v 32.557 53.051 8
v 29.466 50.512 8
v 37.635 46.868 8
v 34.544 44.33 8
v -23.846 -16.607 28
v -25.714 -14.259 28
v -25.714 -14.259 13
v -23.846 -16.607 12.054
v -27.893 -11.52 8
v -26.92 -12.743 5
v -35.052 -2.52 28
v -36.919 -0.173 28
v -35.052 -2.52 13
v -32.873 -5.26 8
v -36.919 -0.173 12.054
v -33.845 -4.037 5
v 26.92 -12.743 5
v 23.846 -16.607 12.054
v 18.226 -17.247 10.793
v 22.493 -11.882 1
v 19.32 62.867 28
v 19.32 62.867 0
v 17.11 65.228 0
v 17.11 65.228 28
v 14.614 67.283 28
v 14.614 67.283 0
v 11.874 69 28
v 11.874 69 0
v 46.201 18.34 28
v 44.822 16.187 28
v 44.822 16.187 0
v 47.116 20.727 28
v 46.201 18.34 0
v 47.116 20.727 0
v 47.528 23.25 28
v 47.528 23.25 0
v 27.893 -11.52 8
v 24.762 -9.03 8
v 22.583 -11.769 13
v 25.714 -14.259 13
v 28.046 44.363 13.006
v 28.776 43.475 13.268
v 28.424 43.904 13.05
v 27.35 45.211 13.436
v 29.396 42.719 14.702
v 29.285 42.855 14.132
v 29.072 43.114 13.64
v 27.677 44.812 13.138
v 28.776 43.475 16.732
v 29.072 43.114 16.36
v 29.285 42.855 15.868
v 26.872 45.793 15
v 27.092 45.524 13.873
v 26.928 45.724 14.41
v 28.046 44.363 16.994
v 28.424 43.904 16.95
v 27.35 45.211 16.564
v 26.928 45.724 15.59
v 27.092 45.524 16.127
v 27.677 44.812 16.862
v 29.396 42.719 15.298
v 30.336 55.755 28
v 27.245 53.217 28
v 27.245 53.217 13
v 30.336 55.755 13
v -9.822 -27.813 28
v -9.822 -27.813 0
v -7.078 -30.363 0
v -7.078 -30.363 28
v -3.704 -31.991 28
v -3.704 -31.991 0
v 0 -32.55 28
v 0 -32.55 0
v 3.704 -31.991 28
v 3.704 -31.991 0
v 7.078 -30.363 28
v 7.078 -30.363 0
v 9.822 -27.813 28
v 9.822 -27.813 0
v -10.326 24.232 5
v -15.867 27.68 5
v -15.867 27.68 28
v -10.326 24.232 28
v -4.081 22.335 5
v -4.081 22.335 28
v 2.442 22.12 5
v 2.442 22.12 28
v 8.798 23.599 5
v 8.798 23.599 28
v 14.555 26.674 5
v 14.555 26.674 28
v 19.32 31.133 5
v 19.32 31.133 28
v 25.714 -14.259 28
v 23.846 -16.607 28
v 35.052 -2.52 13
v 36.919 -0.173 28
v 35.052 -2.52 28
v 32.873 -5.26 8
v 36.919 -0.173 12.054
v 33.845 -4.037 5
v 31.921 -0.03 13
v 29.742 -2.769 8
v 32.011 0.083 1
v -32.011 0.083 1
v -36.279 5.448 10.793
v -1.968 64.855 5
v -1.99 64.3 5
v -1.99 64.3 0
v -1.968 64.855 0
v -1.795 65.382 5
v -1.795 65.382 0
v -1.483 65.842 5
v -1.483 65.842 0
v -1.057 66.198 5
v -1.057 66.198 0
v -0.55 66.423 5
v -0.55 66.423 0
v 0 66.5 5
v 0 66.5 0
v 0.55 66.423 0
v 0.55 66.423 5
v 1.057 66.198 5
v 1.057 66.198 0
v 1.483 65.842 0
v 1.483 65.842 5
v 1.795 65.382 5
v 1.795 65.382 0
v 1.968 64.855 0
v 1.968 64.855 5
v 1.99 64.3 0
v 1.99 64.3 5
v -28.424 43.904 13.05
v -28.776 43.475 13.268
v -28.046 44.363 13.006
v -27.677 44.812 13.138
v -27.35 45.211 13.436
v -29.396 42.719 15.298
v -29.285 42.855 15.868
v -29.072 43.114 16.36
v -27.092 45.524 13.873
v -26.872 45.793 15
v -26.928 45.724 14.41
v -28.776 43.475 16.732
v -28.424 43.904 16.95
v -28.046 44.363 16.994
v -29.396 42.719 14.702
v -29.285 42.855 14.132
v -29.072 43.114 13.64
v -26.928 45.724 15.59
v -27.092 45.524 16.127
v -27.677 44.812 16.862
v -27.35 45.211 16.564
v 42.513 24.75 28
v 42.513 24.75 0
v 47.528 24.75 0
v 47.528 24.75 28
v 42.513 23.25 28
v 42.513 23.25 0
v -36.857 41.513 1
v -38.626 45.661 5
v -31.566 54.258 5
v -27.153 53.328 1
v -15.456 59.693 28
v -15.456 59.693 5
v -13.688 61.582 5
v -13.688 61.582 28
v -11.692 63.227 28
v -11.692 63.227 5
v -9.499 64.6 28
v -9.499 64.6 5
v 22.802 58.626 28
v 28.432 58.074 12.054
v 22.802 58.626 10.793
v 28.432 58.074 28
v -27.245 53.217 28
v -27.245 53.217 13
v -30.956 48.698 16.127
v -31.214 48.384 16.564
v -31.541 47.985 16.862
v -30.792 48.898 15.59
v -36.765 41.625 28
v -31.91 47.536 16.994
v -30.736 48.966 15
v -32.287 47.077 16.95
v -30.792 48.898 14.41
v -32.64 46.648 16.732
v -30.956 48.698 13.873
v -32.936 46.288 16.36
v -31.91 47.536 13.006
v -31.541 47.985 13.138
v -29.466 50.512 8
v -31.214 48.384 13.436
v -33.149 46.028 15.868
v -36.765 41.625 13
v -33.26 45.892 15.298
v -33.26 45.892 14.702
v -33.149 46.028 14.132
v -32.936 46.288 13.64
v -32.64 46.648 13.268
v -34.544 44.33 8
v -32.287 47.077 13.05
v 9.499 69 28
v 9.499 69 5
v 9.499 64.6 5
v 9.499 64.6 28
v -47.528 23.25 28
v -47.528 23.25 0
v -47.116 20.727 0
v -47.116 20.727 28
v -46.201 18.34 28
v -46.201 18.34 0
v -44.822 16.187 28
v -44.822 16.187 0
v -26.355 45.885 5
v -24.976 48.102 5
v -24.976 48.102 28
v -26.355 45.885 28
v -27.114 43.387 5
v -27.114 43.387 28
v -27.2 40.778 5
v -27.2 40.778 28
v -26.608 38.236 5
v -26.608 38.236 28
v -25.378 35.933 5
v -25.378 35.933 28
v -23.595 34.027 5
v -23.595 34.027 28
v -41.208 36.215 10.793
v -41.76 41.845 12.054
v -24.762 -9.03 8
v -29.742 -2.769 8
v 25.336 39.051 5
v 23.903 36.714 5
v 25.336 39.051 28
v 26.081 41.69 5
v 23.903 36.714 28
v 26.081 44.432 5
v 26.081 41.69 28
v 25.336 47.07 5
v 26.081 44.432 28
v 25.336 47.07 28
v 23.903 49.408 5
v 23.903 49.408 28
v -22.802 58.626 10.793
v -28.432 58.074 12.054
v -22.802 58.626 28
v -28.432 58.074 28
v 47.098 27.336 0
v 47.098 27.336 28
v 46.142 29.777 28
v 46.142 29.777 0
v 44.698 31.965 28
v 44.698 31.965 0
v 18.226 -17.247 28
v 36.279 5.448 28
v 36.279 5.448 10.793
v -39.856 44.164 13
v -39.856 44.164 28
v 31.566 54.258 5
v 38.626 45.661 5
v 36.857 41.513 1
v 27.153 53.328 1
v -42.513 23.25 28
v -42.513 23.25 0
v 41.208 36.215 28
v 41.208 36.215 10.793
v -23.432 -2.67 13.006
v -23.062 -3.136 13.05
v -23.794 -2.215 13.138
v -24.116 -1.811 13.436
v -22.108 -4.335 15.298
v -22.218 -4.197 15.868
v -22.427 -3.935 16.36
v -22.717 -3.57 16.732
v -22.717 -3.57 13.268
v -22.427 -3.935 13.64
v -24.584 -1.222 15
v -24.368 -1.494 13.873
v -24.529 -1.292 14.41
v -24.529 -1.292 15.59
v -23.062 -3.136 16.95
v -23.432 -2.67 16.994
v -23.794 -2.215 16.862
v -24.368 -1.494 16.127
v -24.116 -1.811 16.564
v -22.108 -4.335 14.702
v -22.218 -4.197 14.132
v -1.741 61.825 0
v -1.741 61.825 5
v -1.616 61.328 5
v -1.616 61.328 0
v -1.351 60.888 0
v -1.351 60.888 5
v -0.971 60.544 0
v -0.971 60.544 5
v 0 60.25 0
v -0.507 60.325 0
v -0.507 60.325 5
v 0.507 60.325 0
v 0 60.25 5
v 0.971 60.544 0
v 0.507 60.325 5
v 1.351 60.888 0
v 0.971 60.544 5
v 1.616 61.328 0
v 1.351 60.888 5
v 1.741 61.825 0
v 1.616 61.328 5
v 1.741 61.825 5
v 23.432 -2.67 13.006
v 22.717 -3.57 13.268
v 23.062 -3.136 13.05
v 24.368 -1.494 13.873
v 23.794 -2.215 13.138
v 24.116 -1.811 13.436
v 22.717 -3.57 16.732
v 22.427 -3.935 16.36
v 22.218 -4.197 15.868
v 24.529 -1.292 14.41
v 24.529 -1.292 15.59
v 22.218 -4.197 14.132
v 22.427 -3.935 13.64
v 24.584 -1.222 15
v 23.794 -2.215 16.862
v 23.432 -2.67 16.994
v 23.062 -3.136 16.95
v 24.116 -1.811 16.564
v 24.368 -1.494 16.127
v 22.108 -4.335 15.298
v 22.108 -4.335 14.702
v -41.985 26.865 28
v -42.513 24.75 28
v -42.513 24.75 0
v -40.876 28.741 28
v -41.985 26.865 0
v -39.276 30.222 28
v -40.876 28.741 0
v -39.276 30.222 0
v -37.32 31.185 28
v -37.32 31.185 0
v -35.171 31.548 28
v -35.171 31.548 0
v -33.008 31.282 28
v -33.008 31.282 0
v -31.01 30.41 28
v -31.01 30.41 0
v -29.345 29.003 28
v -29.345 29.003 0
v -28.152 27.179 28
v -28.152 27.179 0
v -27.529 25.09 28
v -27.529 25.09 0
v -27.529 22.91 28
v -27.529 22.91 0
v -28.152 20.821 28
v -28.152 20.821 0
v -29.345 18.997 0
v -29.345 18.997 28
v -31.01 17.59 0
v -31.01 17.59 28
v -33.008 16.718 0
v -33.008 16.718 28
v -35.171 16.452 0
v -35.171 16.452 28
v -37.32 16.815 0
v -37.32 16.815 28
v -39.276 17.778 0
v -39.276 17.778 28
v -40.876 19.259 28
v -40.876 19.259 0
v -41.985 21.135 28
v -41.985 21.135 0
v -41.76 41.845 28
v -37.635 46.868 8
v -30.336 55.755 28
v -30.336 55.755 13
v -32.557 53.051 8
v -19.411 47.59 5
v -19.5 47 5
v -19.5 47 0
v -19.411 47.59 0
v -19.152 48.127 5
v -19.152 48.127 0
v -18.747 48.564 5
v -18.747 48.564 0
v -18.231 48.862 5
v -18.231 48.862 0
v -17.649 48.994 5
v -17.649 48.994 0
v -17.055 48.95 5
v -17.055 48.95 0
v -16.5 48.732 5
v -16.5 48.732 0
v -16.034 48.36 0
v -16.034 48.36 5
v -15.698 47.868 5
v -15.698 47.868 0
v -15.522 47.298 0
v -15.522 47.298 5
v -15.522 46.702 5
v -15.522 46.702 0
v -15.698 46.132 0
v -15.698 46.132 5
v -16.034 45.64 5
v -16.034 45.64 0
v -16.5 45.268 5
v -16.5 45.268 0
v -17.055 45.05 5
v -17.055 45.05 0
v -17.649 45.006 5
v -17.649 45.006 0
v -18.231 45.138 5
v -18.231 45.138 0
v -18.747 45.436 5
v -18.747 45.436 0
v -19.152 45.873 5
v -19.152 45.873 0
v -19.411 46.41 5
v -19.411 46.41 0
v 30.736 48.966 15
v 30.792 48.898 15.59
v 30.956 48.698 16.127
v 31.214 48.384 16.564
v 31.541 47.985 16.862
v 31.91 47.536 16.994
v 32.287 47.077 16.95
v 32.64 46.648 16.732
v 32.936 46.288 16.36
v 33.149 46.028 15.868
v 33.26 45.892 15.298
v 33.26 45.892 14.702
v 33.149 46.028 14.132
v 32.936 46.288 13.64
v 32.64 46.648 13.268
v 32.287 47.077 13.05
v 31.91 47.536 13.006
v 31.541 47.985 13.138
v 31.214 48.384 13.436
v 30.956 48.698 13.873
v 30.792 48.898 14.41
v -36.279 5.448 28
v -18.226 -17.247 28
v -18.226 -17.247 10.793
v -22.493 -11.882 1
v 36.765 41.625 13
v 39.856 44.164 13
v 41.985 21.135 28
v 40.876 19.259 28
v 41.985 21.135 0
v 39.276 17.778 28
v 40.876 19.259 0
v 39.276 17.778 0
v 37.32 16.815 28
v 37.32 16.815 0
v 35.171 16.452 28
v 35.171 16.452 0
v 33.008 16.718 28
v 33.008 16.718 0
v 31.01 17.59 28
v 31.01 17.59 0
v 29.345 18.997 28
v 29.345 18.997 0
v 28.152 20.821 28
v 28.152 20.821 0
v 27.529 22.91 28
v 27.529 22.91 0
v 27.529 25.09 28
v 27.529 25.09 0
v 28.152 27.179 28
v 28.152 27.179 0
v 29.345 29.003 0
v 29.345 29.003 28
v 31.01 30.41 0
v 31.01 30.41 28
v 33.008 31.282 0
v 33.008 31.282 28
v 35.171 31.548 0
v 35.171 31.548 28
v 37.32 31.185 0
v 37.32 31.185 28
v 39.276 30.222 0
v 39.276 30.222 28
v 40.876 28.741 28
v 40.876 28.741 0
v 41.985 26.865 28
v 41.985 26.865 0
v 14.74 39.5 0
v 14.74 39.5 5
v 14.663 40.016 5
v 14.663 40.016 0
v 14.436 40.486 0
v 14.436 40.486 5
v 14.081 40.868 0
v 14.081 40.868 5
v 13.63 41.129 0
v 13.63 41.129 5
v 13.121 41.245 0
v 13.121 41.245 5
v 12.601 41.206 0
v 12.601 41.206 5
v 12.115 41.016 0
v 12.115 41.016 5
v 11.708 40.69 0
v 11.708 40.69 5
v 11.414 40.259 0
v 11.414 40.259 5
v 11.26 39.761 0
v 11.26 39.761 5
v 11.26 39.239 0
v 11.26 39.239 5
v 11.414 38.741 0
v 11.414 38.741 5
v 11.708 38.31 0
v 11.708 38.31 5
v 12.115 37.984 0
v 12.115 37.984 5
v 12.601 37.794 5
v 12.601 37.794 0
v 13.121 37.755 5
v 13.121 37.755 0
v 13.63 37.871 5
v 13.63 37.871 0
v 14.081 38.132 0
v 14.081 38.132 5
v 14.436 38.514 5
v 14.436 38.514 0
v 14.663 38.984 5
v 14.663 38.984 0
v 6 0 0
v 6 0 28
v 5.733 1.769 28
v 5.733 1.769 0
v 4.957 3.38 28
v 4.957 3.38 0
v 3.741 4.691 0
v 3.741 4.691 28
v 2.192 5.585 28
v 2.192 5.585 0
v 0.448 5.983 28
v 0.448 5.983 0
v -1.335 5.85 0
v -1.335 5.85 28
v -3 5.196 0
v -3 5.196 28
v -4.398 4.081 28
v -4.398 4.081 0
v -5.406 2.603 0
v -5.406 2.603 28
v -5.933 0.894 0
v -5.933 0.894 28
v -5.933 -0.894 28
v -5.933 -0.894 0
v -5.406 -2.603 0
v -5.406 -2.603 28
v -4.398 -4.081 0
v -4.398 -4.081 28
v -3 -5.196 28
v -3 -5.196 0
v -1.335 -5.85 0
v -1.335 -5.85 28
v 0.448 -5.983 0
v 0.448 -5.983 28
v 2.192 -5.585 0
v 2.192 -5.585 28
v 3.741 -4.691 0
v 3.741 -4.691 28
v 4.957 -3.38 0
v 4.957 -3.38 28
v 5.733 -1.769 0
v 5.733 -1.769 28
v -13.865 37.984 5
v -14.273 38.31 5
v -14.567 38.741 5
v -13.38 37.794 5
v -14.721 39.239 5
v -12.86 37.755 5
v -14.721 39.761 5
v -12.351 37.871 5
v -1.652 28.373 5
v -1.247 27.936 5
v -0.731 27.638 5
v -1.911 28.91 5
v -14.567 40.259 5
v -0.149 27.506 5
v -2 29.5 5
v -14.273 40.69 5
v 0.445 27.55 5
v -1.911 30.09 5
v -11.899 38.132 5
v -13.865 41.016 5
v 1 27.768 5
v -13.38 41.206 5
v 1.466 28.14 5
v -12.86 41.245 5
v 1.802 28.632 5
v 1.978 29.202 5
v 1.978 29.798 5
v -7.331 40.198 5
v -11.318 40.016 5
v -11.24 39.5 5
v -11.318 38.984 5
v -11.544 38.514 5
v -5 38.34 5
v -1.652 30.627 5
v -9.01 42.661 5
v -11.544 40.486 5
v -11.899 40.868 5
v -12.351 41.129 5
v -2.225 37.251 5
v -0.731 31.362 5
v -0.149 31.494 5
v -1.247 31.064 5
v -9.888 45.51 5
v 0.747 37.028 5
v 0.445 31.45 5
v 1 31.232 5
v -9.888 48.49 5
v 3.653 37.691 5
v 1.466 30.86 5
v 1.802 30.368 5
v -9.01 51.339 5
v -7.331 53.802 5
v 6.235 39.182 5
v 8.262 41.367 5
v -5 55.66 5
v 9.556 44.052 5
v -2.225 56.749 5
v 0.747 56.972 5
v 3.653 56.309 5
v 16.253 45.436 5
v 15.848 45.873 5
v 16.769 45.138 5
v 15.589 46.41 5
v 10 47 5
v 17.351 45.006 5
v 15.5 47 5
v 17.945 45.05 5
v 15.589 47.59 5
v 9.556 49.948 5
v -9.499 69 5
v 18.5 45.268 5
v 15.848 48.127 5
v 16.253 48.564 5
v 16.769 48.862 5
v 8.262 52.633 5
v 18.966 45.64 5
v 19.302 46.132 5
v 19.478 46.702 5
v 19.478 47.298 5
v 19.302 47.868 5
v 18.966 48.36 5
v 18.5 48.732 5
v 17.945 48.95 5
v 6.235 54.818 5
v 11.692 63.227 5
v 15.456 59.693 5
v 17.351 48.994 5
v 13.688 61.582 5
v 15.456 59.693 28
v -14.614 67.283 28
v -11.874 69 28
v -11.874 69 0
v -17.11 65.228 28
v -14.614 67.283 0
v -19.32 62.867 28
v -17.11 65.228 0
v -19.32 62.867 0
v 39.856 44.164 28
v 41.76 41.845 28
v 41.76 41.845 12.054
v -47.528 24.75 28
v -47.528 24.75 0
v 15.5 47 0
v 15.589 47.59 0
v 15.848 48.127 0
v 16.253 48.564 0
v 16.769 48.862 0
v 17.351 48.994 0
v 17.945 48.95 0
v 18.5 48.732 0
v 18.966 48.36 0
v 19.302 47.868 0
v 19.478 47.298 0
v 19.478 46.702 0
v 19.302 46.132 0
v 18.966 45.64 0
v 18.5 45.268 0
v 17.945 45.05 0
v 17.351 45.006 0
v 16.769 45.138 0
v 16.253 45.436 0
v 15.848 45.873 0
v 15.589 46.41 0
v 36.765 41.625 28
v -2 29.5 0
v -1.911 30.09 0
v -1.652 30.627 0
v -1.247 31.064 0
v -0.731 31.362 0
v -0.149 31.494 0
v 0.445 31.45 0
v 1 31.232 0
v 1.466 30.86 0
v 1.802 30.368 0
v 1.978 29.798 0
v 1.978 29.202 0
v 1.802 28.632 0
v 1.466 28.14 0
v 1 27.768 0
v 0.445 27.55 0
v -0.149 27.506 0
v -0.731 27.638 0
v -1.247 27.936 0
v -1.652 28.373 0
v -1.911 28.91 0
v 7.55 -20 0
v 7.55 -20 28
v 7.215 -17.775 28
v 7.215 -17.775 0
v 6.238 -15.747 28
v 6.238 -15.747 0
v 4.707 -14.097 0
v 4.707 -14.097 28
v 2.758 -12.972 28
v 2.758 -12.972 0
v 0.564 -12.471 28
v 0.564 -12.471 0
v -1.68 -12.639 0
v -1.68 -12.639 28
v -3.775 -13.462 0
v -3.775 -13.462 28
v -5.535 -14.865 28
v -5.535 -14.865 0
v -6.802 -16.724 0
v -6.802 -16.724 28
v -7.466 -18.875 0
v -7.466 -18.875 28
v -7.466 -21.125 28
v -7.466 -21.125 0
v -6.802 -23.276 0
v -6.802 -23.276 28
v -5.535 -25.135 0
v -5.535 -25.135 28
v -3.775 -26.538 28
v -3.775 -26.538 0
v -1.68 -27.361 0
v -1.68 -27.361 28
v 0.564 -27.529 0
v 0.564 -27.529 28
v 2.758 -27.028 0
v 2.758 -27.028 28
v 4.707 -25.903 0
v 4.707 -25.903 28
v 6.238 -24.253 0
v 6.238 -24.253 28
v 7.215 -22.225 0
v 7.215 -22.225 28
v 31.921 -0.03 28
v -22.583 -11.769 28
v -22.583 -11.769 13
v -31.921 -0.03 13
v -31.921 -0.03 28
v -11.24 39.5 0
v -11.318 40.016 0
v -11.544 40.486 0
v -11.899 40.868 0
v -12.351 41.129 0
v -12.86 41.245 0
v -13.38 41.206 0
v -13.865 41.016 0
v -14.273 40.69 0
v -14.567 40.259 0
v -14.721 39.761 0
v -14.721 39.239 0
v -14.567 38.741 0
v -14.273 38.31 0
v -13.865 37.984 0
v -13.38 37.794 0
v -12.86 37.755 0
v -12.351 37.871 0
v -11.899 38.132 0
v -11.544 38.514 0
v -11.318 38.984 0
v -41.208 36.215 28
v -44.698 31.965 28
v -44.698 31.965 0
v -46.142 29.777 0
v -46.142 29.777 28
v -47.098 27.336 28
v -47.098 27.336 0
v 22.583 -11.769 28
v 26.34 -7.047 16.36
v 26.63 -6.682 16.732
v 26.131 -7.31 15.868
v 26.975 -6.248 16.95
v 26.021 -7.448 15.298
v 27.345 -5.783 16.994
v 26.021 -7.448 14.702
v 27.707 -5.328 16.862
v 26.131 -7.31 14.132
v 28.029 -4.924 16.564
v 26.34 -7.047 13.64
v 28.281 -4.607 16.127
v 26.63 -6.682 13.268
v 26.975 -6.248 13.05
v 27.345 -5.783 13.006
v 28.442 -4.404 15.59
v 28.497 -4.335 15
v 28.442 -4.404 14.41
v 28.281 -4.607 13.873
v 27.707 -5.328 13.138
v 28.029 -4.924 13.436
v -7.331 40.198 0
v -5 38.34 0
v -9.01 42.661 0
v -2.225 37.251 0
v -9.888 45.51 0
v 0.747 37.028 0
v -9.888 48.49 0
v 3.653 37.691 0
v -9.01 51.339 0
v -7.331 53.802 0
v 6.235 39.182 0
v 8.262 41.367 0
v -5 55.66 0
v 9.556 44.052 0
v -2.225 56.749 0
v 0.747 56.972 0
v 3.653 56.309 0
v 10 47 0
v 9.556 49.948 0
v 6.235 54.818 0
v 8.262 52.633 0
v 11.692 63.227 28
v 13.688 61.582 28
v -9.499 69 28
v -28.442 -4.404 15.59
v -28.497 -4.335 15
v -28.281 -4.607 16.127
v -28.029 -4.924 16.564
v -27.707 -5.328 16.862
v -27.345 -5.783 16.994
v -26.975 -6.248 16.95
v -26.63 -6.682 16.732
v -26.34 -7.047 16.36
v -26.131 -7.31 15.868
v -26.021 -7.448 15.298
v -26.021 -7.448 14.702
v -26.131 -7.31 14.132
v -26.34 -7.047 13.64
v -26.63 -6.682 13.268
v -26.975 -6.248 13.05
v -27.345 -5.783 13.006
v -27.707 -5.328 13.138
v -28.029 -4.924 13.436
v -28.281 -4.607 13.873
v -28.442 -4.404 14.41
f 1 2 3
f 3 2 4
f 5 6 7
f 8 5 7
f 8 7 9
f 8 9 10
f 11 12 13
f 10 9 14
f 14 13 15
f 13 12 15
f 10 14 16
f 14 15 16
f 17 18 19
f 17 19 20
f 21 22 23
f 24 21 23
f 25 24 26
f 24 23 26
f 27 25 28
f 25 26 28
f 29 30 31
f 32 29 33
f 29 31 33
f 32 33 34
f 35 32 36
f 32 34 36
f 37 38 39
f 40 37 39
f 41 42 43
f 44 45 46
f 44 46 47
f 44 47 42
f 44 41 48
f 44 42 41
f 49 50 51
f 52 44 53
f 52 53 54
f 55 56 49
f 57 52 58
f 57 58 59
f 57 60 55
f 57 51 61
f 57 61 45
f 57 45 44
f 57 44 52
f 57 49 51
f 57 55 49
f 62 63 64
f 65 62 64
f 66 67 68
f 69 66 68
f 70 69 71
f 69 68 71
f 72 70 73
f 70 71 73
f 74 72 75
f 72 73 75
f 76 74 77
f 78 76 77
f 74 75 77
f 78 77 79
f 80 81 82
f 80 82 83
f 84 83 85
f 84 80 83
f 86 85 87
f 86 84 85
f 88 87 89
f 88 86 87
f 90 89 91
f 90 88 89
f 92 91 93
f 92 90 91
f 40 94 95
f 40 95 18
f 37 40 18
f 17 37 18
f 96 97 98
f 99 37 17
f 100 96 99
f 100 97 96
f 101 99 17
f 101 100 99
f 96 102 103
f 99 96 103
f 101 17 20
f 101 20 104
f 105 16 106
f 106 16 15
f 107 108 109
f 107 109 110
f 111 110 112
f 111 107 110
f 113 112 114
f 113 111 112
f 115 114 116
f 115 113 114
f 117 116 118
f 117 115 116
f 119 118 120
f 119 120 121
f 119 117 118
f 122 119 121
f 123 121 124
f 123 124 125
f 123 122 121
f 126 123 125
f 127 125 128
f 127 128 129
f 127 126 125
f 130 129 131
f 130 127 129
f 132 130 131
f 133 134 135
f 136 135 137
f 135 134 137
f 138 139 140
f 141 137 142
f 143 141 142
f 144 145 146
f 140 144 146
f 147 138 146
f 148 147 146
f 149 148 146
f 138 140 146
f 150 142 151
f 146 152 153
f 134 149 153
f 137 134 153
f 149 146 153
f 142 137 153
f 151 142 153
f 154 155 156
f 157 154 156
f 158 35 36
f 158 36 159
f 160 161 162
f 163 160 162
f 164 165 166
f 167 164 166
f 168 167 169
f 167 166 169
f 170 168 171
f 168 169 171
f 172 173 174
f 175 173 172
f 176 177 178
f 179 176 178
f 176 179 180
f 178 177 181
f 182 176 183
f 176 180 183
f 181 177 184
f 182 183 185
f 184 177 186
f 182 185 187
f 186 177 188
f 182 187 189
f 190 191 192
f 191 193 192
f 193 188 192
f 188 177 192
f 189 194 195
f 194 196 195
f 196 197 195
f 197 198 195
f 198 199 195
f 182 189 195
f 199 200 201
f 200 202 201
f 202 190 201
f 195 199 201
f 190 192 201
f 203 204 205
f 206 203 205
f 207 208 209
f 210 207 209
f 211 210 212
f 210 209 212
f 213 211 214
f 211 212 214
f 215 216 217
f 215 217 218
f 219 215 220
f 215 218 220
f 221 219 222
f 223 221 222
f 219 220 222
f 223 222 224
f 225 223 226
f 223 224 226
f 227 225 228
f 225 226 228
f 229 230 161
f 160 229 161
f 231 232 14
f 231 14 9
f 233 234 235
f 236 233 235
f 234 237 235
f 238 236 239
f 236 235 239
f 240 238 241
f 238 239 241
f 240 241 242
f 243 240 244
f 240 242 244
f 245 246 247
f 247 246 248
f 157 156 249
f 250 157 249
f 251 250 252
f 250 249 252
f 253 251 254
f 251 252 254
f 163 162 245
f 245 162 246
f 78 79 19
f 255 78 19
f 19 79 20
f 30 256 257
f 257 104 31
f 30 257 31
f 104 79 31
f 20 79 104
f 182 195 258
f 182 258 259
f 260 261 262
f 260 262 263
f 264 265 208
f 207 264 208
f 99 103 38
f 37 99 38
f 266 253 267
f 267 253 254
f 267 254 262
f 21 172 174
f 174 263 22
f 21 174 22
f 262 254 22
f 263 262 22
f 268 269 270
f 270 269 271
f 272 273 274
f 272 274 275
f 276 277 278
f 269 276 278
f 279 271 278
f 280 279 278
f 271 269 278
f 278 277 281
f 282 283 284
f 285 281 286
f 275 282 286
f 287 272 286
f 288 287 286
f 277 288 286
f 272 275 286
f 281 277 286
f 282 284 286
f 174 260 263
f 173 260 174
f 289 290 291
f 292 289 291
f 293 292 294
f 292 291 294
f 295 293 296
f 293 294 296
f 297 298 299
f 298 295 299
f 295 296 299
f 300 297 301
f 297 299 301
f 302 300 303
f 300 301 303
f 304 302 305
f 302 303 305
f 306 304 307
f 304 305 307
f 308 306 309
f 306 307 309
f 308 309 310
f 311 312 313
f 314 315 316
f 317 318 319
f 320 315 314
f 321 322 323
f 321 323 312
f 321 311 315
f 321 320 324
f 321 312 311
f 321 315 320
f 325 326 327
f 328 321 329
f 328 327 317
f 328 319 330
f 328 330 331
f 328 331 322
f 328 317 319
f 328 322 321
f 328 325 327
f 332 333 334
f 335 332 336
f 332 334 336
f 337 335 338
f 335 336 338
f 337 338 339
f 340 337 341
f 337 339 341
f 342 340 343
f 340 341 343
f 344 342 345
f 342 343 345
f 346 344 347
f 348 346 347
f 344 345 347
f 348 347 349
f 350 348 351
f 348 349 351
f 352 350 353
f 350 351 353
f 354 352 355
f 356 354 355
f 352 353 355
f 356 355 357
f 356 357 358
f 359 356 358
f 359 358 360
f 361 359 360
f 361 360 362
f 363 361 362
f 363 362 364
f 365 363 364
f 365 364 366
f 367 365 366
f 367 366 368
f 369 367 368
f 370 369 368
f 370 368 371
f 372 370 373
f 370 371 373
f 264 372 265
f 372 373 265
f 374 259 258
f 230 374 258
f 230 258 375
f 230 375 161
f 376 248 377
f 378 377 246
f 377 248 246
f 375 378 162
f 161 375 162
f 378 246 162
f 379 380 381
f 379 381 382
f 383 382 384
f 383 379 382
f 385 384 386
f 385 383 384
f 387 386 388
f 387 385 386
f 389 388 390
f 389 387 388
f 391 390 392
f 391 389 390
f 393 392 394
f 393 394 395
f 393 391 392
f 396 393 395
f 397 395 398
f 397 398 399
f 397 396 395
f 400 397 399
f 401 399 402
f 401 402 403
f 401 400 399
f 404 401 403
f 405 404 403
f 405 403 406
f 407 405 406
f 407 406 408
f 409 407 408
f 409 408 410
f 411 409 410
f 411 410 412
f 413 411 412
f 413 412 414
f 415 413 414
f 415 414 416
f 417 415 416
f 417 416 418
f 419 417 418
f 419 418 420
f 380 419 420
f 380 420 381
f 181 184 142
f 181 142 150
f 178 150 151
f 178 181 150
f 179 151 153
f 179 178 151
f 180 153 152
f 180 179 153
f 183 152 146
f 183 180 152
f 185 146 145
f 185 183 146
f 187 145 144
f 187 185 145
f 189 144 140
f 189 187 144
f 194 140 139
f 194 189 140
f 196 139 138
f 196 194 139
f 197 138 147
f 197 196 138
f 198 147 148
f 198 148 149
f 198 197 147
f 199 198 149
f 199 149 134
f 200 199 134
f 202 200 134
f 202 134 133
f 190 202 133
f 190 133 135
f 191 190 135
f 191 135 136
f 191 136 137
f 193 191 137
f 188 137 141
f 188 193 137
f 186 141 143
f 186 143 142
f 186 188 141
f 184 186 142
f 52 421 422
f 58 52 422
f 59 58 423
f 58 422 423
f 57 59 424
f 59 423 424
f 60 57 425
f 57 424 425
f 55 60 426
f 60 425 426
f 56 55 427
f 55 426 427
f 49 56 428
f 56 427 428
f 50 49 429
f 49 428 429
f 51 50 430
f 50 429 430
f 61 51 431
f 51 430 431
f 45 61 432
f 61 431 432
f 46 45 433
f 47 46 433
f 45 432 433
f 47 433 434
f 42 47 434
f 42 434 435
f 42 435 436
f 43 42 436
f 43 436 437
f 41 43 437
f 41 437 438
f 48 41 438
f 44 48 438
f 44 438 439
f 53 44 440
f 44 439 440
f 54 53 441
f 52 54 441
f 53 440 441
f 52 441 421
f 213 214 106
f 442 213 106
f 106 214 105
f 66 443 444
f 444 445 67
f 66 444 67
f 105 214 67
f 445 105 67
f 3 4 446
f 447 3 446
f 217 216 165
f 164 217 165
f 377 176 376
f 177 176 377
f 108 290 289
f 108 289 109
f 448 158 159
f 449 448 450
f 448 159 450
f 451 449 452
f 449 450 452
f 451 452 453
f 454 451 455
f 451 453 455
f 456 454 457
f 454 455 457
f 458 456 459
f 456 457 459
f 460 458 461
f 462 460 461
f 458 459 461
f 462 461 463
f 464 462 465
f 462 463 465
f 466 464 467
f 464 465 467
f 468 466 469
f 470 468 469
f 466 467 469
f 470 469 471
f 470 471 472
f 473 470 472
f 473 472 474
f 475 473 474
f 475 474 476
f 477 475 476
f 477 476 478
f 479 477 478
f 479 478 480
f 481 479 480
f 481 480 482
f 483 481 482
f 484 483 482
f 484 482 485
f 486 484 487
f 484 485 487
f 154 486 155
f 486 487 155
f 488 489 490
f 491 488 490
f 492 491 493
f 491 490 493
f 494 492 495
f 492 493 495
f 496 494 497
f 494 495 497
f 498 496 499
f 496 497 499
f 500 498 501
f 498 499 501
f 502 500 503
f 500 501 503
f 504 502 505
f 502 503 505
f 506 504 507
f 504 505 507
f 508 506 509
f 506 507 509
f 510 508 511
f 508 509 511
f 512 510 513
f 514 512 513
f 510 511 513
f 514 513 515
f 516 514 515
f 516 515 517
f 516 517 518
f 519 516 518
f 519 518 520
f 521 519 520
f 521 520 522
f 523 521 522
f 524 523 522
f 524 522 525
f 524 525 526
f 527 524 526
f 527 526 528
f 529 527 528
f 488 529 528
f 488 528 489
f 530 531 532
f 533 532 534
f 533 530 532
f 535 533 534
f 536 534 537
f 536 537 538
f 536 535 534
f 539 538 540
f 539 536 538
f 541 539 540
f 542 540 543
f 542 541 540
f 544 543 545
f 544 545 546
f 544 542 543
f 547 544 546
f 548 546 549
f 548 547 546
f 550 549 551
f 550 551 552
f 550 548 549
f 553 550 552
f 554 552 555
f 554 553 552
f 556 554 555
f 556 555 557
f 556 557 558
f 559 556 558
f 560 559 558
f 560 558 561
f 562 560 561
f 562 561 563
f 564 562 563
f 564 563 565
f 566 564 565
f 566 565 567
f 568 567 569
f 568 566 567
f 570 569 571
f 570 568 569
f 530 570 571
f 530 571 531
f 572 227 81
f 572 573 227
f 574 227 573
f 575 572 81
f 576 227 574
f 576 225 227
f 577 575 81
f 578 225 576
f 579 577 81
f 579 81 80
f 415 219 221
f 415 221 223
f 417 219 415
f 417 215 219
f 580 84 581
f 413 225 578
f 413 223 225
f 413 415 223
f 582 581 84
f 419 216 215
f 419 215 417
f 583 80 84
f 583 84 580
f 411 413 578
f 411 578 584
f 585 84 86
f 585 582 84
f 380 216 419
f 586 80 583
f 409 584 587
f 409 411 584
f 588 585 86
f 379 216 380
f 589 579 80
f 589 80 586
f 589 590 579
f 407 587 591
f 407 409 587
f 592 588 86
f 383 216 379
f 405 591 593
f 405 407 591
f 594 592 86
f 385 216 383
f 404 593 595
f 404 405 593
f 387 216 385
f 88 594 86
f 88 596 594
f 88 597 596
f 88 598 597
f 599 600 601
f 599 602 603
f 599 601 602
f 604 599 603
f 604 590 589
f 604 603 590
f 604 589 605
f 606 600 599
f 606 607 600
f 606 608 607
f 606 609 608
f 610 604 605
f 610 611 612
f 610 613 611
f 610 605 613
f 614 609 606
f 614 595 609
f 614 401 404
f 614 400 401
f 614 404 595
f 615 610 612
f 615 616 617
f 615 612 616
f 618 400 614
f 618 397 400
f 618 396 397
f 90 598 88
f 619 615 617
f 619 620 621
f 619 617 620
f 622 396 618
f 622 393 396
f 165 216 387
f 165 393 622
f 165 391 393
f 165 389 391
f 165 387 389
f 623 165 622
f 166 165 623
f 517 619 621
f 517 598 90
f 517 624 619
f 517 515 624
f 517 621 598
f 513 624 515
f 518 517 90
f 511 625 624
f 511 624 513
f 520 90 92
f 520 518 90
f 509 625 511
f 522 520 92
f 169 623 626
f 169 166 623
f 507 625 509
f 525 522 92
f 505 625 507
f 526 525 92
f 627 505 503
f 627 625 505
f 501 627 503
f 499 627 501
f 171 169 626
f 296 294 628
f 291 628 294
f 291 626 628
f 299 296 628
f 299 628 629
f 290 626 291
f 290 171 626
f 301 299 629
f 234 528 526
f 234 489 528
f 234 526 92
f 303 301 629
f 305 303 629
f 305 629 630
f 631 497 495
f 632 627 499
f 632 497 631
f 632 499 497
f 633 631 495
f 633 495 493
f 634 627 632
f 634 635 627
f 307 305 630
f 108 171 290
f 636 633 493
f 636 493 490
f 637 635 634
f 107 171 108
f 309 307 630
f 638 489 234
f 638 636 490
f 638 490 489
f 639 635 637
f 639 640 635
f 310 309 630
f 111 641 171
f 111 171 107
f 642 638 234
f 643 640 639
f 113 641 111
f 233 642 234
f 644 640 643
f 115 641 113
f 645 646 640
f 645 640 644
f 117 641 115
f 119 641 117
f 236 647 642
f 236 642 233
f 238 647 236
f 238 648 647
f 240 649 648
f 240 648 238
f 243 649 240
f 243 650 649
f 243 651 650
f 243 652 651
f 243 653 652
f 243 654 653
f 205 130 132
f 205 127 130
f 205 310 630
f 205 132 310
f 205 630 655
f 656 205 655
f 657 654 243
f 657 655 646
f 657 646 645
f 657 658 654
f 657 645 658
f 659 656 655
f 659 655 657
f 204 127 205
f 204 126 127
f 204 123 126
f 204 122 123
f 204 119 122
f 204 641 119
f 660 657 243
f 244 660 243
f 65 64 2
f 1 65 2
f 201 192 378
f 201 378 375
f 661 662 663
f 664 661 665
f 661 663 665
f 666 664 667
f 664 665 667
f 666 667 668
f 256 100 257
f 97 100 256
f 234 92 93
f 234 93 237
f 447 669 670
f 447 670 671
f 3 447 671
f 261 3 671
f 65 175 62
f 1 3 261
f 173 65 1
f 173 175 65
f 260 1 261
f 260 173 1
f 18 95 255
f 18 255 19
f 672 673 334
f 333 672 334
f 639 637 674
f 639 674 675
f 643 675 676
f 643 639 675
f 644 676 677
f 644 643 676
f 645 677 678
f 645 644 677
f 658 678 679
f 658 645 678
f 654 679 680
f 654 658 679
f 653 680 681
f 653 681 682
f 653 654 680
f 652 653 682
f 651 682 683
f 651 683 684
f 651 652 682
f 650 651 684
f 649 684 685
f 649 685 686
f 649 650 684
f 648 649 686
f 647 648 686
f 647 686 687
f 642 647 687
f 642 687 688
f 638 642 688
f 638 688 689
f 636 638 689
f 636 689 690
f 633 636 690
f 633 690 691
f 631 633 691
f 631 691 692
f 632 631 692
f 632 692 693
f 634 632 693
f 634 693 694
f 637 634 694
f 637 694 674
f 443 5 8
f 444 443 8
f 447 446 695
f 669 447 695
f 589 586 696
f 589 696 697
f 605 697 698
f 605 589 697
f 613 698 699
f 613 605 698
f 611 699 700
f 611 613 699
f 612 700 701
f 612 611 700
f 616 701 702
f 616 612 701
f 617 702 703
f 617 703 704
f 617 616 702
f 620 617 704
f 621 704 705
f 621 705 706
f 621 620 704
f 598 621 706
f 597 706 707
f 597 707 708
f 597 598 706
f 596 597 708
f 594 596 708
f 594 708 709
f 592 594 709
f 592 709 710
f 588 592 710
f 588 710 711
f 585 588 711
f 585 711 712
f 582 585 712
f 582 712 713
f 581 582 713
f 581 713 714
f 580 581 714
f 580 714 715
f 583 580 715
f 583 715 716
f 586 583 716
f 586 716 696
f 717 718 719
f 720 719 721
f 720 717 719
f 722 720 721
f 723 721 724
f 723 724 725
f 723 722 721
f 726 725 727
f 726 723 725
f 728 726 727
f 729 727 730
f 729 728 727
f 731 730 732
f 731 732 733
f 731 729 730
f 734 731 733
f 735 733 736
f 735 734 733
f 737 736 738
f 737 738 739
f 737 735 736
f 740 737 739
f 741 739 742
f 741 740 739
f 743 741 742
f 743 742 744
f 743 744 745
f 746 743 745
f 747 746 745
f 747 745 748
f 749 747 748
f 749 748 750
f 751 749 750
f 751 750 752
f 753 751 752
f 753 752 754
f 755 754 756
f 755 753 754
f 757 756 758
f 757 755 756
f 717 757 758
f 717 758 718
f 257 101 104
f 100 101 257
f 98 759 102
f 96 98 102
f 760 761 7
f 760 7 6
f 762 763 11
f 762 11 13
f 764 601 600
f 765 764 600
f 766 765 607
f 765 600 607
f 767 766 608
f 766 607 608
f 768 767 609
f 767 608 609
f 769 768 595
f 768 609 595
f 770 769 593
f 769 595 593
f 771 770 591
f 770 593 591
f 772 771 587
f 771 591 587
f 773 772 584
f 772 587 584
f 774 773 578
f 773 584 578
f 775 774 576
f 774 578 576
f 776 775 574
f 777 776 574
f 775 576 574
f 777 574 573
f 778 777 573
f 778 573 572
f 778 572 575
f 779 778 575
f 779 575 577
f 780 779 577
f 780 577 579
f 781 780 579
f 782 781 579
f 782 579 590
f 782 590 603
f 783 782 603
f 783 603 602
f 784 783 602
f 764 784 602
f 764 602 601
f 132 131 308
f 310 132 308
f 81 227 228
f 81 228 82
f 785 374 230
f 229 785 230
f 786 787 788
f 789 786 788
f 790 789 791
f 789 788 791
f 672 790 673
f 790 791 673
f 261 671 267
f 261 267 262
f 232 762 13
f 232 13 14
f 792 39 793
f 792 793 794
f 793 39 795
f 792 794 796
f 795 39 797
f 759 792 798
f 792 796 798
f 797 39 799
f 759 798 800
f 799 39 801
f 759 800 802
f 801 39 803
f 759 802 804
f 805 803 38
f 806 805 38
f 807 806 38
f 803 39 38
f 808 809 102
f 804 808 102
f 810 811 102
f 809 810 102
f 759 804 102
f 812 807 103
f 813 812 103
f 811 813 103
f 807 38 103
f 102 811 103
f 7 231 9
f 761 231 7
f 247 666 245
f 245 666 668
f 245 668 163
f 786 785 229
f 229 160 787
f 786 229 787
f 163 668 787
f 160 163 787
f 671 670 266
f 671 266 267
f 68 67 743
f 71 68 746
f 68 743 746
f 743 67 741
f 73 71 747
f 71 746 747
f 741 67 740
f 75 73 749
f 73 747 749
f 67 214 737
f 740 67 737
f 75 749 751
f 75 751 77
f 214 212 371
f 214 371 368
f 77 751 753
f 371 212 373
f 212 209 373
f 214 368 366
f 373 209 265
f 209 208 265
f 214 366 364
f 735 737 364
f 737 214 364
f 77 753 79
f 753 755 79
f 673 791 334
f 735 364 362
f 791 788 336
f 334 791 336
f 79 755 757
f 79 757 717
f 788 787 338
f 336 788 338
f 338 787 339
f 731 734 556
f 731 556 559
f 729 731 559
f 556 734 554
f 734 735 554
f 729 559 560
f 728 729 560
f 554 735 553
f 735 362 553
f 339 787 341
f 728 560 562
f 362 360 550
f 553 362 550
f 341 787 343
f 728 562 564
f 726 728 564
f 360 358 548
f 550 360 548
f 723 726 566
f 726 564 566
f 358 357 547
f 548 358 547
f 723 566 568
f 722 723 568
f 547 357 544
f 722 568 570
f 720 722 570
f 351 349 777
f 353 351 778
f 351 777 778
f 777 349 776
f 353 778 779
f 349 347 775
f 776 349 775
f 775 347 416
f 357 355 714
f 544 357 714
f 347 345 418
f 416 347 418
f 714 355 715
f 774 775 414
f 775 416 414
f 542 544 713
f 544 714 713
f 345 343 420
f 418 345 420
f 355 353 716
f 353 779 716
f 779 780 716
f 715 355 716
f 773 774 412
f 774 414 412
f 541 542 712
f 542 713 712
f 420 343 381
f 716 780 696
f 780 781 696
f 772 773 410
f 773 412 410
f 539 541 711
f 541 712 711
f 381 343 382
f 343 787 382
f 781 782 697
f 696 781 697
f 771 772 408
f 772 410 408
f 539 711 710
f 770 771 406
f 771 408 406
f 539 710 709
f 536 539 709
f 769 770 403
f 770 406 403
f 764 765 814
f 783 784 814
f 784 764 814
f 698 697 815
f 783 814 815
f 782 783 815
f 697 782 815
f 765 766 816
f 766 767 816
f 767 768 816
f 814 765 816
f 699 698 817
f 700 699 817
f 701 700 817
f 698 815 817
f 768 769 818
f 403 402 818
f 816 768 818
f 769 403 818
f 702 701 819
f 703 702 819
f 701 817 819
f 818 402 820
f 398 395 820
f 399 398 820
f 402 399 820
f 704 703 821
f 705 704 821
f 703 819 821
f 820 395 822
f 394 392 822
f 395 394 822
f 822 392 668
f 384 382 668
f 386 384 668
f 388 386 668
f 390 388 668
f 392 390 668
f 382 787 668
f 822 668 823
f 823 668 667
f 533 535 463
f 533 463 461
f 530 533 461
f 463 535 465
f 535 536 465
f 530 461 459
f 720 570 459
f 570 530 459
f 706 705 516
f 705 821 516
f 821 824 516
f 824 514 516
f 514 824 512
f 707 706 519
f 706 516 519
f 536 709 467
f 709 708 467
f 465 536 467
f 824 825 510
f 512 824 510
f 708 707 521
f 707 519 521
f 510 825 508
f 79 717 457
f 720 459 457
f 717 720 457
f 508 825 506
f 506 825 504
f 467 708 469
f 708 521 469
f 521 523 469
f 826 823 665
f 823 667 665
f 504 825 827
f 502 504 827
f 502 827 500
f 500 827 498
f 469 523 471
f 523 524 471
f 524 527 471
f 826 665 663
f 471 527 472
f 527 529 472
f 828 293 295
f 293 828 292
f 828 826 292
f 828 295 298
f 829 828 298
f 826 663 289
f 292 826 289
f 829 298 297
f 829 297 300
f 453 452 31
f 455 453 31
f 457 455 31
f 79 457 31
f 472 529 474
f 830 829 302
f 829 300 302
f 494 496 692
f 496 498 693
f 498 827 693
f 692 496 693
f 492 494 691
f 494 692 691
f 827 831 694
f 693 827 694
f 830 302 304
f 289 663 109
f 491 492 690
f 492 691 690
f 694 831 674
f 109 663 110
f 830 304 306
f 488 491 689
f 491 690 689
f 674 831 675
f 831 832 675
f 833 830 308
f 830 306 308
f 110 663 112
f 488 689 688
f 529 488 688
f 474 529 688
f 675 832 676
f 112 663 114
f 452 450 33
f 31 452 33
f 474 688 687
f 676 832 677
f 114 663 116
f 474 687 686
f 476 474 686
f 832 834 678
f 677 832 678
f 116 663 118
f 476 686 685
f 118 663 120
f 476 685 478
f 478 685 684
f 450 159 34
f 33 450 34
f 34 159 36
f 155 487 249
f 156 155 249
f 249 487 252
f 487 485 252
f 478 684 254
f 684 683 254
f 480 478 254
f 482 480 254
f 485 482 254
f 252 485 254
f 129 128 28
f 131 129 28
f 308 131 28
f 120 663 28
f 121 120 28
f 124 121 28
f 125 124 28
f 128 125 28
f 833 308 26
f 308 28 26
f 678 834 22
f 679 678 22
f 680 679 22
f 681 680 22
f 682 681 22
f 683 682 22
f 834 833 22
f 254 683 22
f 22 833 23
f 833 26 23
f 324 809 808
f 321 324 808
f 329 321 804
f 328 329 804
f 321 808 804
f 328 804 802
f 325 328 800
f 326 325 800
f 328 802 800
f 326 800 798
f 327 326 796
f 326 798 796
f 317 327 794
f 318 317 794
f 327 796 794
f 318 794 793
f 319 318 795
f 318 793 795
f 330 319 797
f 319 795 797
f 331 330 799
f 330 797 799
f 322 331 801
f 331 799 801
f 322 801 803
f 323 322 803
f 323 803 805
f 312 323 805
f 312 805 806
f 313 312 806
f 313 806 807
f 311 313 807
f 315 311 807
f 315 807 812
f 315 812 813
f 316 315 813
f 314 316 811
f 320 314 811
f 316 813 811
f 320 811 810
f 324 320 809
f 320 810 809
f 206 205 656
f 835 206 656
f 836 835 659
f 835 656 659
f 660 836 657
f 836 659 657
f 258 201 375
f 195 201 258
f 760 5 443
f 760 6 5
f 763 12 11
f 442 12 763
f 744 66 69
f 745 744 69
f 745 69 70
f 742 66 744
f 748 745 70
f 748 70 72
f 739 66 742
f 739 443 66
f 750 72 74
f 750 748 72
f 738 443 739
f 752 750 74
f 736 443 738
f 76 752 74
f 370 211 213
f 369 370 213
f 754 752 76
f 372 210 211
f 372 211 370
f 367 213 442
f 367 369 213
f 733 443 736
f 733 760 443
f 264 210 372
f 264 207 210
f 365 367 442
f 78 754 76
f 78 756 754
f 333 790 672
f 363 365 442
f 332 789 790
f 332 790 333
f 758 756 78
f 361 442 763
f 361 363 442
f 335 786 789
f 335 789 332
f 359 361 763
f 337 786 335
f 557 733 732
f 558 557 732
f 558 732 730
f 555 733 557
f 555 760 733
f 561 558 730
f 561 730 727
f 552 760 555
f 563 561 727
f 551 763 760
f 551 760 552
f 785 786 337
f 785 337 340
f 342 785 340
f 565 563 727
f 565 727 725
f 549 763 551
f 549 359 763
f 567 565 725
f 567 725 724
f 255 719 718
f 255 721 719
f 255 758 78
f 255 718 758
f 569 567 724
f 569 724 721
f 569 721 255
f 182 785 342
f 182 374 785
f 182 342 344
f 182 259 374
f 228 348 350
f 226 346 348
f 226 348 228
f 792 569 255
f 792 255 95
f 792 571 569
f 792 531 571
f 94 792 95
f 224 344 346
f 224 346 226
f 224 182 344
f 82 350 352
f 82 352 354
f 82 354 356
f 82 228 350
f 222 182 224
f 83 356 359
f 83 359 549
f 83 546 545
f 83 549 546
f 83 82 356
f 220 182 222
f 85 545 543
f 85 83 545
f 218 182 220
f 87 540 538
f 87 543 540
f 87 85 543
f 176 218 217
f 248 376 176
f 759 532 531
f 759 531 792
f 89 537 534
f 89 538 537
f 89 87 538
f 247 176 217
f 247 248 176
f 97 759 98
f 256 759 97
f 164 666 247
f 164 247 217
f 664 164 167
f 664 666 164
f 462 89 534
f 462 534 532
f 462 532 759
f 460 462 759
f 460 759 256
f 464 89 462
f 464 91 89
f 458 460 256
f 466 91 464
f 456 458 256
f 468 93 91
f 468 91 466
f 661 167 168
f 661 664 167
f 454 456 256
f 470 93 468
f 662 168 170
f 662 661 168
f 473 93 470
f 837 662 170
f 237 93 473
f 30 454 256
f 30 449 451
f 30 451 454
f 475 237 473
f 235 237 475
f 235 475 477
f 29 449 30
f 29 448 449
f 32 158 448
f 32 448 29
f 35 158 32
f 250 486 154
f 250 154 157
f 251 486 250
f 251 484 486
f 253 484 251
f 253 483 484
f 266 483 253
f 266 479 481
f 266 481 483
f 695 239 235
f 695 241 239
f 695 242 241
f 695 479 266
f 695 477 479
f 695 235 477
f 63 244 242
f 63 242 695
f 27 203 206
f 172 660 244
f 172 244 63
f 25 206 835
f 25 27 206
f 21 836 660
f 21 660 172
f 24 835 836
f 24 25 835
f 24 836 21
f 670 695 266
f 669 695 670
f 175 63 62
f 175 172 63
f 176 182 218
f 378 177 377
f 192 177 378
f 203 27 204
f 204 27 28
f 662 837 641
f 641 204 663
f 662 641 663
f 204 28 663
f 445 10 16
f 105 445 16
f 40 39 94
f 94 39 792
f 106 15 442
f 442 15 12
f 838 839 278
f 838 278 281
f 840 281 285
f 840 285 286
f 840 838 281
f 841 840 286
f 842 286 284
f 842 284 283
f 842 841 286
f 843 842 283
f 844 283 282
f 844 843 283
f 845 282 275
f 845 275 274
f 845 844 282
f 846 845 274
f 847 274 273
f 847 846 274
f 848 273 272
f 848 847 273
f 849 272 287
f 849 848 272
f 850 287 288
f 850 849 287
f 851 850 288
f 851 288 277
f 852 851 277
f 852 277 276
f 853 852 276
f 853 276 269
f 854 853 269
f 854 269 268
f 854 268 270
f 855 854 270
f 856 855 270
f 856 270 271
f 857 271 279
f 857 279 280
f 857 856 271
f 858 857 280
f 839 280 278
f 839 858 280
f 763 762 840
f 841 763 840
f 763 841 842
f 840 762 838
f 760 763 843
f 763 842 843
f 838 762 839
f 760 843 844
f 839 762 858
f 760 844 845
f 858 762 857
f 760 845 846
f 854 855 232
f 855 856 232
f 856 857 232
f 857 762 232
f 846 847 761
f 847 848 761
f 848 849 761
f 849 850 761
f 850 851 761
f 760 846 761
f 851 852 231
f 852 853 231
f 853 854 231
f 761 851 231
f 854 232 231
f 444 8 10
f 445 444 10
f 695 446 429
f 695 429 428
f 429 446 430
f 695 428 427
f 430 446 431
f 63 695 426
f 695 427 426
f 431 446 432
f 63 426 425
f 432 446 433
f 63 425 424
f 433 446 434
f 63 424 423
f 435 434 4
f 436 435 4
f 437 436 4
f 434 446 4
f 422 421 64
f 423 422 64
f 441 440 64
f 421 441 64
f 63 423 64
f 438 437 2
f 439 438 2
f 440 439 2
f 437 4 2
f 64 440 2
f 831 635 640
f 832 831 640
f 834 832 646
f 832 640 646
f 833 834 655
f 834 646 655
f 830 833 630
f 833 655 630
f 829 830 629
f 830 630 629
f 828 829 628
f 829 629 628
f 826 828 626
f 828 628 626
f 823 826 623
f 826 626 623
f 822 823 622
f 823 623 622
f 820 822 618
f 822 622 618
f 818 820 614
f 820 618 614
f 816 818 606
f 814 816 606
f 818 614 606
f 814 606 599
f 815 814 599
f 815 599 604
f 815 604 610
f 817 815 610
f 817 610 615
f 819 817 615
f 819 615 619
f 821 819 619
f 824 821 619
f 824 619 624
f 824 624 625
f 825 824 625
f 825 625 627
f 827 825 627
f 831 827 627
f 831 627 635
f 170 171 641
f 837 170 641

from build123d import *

# Parameters (mm, degrees)
SZKIC1_R                    = 7.550000000001571
SZKIC1_R_2                  = 6.000000000000003
DODANIE_WYCI_GNI_CIE1_DEPTH = 28
WYTNIJ_WYCI_GNI_CIE1_START  = -23
WYTNIJ_WYCI_GNI_CIE1_DEPTH  = 23
SZKIC3_R                    = 10.000000000000002
SZKIC3_R_2                  = 1.7500000000000033
SZKIC3_R_3                  = 1.7500000000000069
SZKIC3_R_4                  = 1.750000000000002
WYTNIJ_WYCI_GNI_CIE2_DEPTH  = 23
DODANIE_WYCI_GNI_CIE2_DEPTH = 23
ZAOKR_GLENIE2_R             = 10
WYTNIJ_WYCI_GNI_CIE3_START  = -10
SZKIC5_R                    = 2.000000000000005
SZKIC5_R_2                  = 2.0000000000000036
SZKIC5_R_3                  = 2.000000000000003
SZKIC5_R_4                  = 1.9999999999999971
SZKIC5_R_5                  = 1.7500000000000033
WYTNIJ_WYCI_GNI_CIE3_DEPTH  = 10
DODANIE_WYCI_GNI_CIE3_DEPTH = 4
SFAZOWANIE1_SIZE            = 4
DODANIE_WYCI_GNI_CIE4_DEPTH = 4
SFAZOWANIE2_SIZE            = 4
SZKIC8_R                    = 2.0000000000000018
WYTNIJ_WYCI_GNI_CIE4_DEPTH  = 5
SZKIC9_R                    = 1.9999999999999996
WYTNIJ_WYCI_GNI_CIE5_DEPTH  = 5
SFAZOWANIE3_SIZE            = 4


with BuildPart() as part:
    # Szkic1 → Dodanie-wyciągnięcie1 (new body)
    with BuildSketch(Plane.XY):
        with BuildLine():
            Line((-19.31958004687979, 62.866752245251845), (-44.69842918353365, 31.96510962711642))
            ThreePointArc((-44.69842918353365, 31.96510962711642), (-46.68388664689503, 28.581407297164034), (-47.527569596693525, 24.749999999999982))
            Line((-47.52756959669351, 24.74999999999998), (-42.512655988397164, 24.74999999999998))
            ThreePointArc((-42.51265598839718, 24.74999999999998), (-27.44999999999999, 24.000000000000014), (-42.51265598839717, 23.249999999999975))
            Line((-42.512655988397164, 23.24999999999998), (-47.52756959669352, 23.249999999999982))
            ThreePointArc((-47.52756959669352, 23.249999999999982), (-46.71930706256188, 19.509973054269363), (-44.82164322990438, 16.187329248939687))
            Line((-44.82164322990438, 16.18732924893969), (-9.82164322990438, -27.81267075106031))
            ThreePointArc((-9.82164322990438, -27.81267075106031), (8.21e-15, -32.55), (9.821643229904398, -27.81267075106031))
            Line((9.821643229904394, -27.812670751060306), (44.82164322990439, 16.187329248939694))
            ThreePointArc((44.82164322990438, 16.18732924893969), (46.71930706256188, 19.509973054269366), (47.52756959669352, 23.249999999999986))
            Line((47.52756959669352, 23.249999999999993), (42.512655988397164, 23.24999999999999))
            ThreePointArc((42.51265598839717, 23.249999999999986), (27.44999999999999, 24.00000000000001), (42.51265598839718, 24.74999999999999))
            Line((42.512655988397164, 24.74999999999999), (47.52756959669351, 24.74999999999999))
            ThreePointArc((47.52756959669352, 24.74999999999999), (46.68388664689503, 28.581407297164038), (44.69842918353365, 31.965109627116423))
            Line((44.698429183533655, 31.965109627116426), (19.319580046879793, 62.866752245251845))
            ThreePointArc((19.319580046879786, 62.866752245251845), (15.895577263173283, 66.29587063261175), (11.874342087037947, 68.99999999999999))
            Line((11.874342087037945, 68.99999999999999), (-11.874342087037945, 68.99999999999999))
            ThreePointArc((-11.87434208703795, 68.99999999999999), (-15.895577263173287, 66.29587063261175), (-19.31958004687979, 62.866752245251845))
        make_face()
        with Locations((-6.187e-14, -19.99999999999843)):
            Circle(SZKIC1_R, mode=Mode.SUBTRACT)
        Circle(SZKIC1_R_2, mode=Mode.SUBTRACT)
    extrude(amount=DODANIE_WYCI_GNI_CIE1_DEPTH)

    # Szkic2 → Wytnij-wyciągnięcie1 (cut)
    with BuildSketch(Plane.XY.offset(28).offset(WYTNIJ_WYCI_GNI_CIE1_START)):
        with BuildLine():
            Line((32.35059967573885, 47), (19.319580046879782, 62.866752245251845))
            ThreePointArc((19.319580046879782, 62.866752245251845), (15.89557726317328, 66.29587063261175), (11.874342087037947, 68.99999999999997))
            Line((11.874342087037945, 68.99999999999999), (-11.874342087037942, 68.99999999999999))
            ThreePointArc((-11.87434208703794, 68.99999999999999), (-15.895577263173282, 66.29587063261175), (-19.319580046879786, 62.86675224525184))
            Line((-19.31958004687979, 62.866752245251845), (-35.18633229213164, 43.54717219837204))
            Line((-35.18633229213164, 43.54717219837204), (-15.866752245251844, 27.680419953120204))
            ThreePointArc((-15.866752245251835, 27.680419953120207), (2.441517952800565, 22.11950583115053), (19.31958004687979, 31.13324775474816))
            Line((19.319580046879796, 31.133247754748155), (32.35059967573885, 47))
        make_face()
    extrude(amount=WYTNIJ_WYCI_GNI_CIE1_DEPTH, mode=Mode.SUBTRACT)

    # Szkic3 → Wytnij-wyciągnięcie2 (cut)
    with BuildSketch(Plane.XY.offset(5.000000000000001)):
        with Locations((0, 47)):
            Circle(SZKIC3_R)
        with Locations((0, 62)):
            Circle(SZKIC3_R_2)
        with Locations((12.990381056766878, 39.50000000000017)):
            Circle(SZKIC3_R_3)
        with Locations((-12.990381056766289, 39.49999999999982)):
            Circle(SZKIC3_R_4)
    extrude(amount=-WYTNIJ_WYCI_GNI_CIE2_DEPTH, mode=Mode.SUBTRACT)

    # Szkic4 → Dodanie-wyciągnięcie2 (add)
    with BuildSketch(Plane.XY.offset(5.000000000000001)):
        with BuildLine():
            Line((-9.499473669630353, 64.6), (-9.499473669630355, 69))
            Line((-9.499473669630355, 68.99999999999999), (-11.874342087037942, 68.99999999999999))
            ThreePointArc((-11.874342087037942, 68.99999999999999), (-15.895577263173275, 66.29587063261174), (-19.319580046879786, 62.866752245251845))
            Line((-19.31958004687979, 62.866752245251845), (-35.18633229213164, 43.54717219837204))
            Line((-35.18633229213164, 43.54717219837204), (-31.322416282755675, 40.37382174932167))
            Line((-31.322416282755682, 40.373821749321664), (-15.45566403750383, 59.69340179620147))
            ThreePointArc((-15.45566403750383, 59.69340179620147), (-12.716461810538625, 62.436696506089405), (-9.499473669630351, 64.6))
        make_face()
        with BuildLine():
            Line((29.115539708164945, 43.06094561546435), (32.350599675738835, 47))
            Line((32.350599675738835, 47), (19.319580046879796, 62.866752245251845))
            ThreePointArc((19.319580046879793, 62.866752245251845), (15.895577263173287, 66.29587063261175), (11.874342087037945, 68.99999999999999))
            Line((11.874342087037945, 68.99999999999999), (9.499473669630357, 68.99999999999999))
            Line((9.499473669630357, 69), (9.499473669630357, 64.6))
            ThreePointArc((9.499473669630355, 64.6), (12.716461810538629, 62.436696506089405), (15.455664037503837, 59.69340179620148))
            Line((15.455664037503837, 59.69340179620148), (28.48668366636287, 43.82664955094963))
            Line((28.48668366636287, 43.82664955094963), (29.115539708164945, 43.06094561546435))
        make_face()
    extrude(amount=DODANIE_WYCI_GNI_CIE2_DEPTH)

    # Zaokrąglenie2
    zaokr_glenie2_edges = [part.edges().sort_by_distance(p)[0] for p in [
        (-31.32241628275568, 40.373821749321664, 16.5),
        (29.115539708164945, 43.06094561546435, 16.5),
    ]]
    fillet(zaokr_glenie2_edges, radius=ZAOKR_GLENIE2_R)

    # Szkic5 → Wytnij-wyciągnięcie3 (cut)
    with BuildSketch(Plane(origin=(0, 0, 0), x_dir=(-1, 0, 0), z_dir=(0, 0, -1)).offset(WYTNIJ_WYCI_GNI_CIE3_START)):
        with Locations((-17.5, 47.00000000000005)):
            Circle(SZKIC5_R)
        with Locations((17.5, 46.99999999999994)):
            Circle(SZKIC5_R_2)
        with Locations((-4.684e-14, 29.5)):
            Circle(SZKIC5_R_3)
        with Locations((5.896e-14, 64.5)):
            Circle(SZKIC5_R_4)
        with Locations((0, 62)):
            Circle(SZKIC5_R_5)
        with BuildLine():
            ThreePointArc((-1.3905372163304106, 63.062500000000036), (-1.7999491829154104, 63.6281152949375), (-1.9899748742131833, 64.30000000000005))
            Line((-1.9899748742131869, 64.30000000000005), (-1.7412280149365922, 61.82500000000004))
            ThreePointArc((-1.7412280149365924, 61.82500000000004), (-1.683698289018324, 62.47713737178802), (-1.3905372163304301, 63.062500000000014))
        make_face()
        with BuildLine():
            ThreePointArc((1.7500000000000036, 62), (1.7478056279430847, 61.91239014364529), (1.7412280149365837, 61.82499999999995))
            Line((1.741228014936584, 61.82499999999995), (1.989974874213301, 64.30000000000005))
            ThreePointArc((1.9899748742133014, 64.30000000000005), (1.7999491829155065, 63.62811529493745), (1.3905372163304575, 63.062499999999964))
            ThreePointArc((1.3905372163304832, 63.06249999999994), (1.6577002335432005, 62.56082968511914), (1.7500000000000036, 62))
        make_face()
    extrude(amount=WYTNIJ_WYCI_GNI_CIE3_DEPTH, mode=Mode.SUBTRACT)

    # Szkic6 → Dodanie-wyciągnięcie3 (add)
    with BuildSketch(Plane(origin=(42.37131210135847, 34.798640021529614, 0), x_dir=(0, 0, -1), z_dir=(0.7727832018751915, 0.6346700898100739, 0))):
        Polygon((-28.000000000000004, 26.833343701652026), (-28.000000000000004, 23.833343701652026), (-13.000000000000002, 23.833343701652026), (-8, 20.333343701652034), (-8, 12.333343701652028), (-13.000000000000002, 8.83334370165203), (-28, 8.833343701652032), (-28, 5.83334370165203), (-12.0543333075427, 5.83334370165203), (-5, 10.771377016931917), (-5, 21.895310386372145), (-12.0543333075427, 26.833343701652026), align=None)
    dodanie_wyci_gni_cie3 = extrude(amount=DODANIE_WYCI_GNI_CIE3_DEPTH)

    # Sfazowanie1
    sfazowanie1_edges = [part.edges().sort_by_distance(p)[0] for p in [
        (25.3409914443264, 55.53499728430977, 20.027166653771353),
        (26.908002468173308, 53.62698268613559, 8.52716665377135),
        (32.00502738733217, 47.42077366462026, 5),
        (37.10205230649103, 41.21456464310493, 8.52716665377135),
        (38.66906333033795, 39.30655004493075, 20.02716665377135),
    ]]
    chamfer(sfazowanie1_edges, length=SFAZOWANIE1_SIZE - 0.0001)  # a hair under: the kernel refuses the full size

    # Szkic7 → Dodanie-wyciągnięcie4 (add)
    with BuildSketch(Plane(origin=(19.565395207126798, -15.563382551123588, 0), x_dir=(0, 0, -1), z_dir=(0.7826010541756485, -0.6225235658215388, 0))):
        Polygon((-28, 22.84797891648703), (-28, 19.84797891648703), (-13.000000000000002, 19.84797891648703), (-8, 16.34797891648703), (-8, 8.347978916487031), (-13.000000000000002, 4.8479789164870315), (-28, 4.847978916487031), (-28, 1.8479789164870304), (-12.0543333075427, 1.8479789164870304), (-5, 6.78601223176692), (-5, 17.909945601207145), (-12.054333307542692, 22.84797891648703), align=None)
    dodanie_wyci_gni_cie4 = extrude(amount=DODANIE_WYCI_GNI_CIE4_DEPTH)

    # Sfazowanie2
    sfazowanie2_edges = [part.edges().sort_by_distance(p)[0] for p in [
        (20.71580563178133, -14.117152302986465, 20.02716665377135),
        (22.252826685568124, -12.184897263940208, 8.52716665377135),
        (27.252303072907488, -5.899841234142155, 5),
        (32.251779460246844, 0.3852147956558962, 8.527166653771346),
        (33.78880051403364, 2.317469834702152, 20.027166653771346),
    ]]
    chamfer(sfazowanie2_edges, length=SFAZOWANIE2_SIZE - 0.0001)  # a hair under: the kernel refuses the full size

    # Szkic8 → Wytnij-wyciągnięcie4 (cut)
    with BuildSketch(Plane(origin=(42.37131210135847, 34.798640021529614, 0), x_dir=(0, 0, -1), z_dir=(0.7727832018751915, 0.6346700898100739, 0))):
        with Locations(Location((-15, 16.333343701652037, 0), (0, 0, 90))):
            Circle(SZKIC8_R)
    wytnij_wyci_gni_cie4 = extrude(amount=-WYTNIJ_WYCI_GNI_CIE4_DEPTH, mode=Mode.SUBTRACT)

    # Szkic9 → Wytnij-wyciągnięcie5 (cut)
    with BuildSketch(Plane(origin=(19.565395207126798, -15.563382551123588, 0), x_dir=(0, 0, -1), z_dir=(0.7826010541756485, -0.6225235658215388, 0))):
        with Locations(Location((-15, 12.347978916487023, 0), (0, 0, 90))):
            Circle(SZKIC9_R)
    wytnij_wyci_gni_cie5 = extrude(amount=-WYTNIJ_WYCI_GNI_CIE5_DEPTH, mode=Mode.SUBTRACT)

    # Lustro3: Dodanie-wyciągnięcie3, Dodanie-wyciągnięcie4, Wytnij-wyciągnięcie4, Wytnij-wyciągnięcie5 across plane
    add(dodanie_wyci_gni_cie3.mirror(Plane(origin=(0, 0, 0), x_dir=(0, 0, 1), z_dir=(1, 0, 0))))
    add(dodanie_wyci_gni_cie4.mirror(Plane(origin=(0, 0, 0), x_dir=(0, 0, 1), z_dir=(1, 0, 0))))
    add(wytnij_wyci_gni_cie4.mirror(Plane(origin=(0, 0, 0), x_dir=(0, 0, 1), z_dir=(1, 0, 0))), mode=Mode.SUBTRACT)
    add(wytnij_wyci_gni_cie5.mirror(Plane(origin=(0, 0, 0), x_dir=(0, 0, 1), z_dir=(1, 0, 0))), mode=Mode.SUBTRACT)

    # Sfazowanie3
    sfazowanie3_edges = [part.edges().sort_by_distance(p)[0] for p in [
        (-25.340991444326406, 55.534997284309775, 20.027166653771353),
        (-26.908002468173336, 53.6269826861356, 8.52716665377135),
        (-32.00502738733219, 47.42077366462027, 5),
        (-37.102052306491046, 41.214564643104936, 8.52716665377135),
        (-38.66906333033795, 39.30655004493076, 20.02716665377135),
        (-33.78880051403364, 2.317469834702152, 20.027166653771346),
        (-32.25177946024685, 0.3852147956558962, 8.527166653771346),
        (-27.25230307290748, -5.899841234142151, 5),
        (-22.252826685568124, -12.184897263940208, 8.527166653771351),
        (-20.71580563178133, -14.117152302986465, 20.02716665377135),
    ]]
    chamfer(sfazowanie3_edges, length=SFAZOWANIE3_SIZE - 0.0001)  # a hair under: the kernel refuses the full size


solid = part.part
